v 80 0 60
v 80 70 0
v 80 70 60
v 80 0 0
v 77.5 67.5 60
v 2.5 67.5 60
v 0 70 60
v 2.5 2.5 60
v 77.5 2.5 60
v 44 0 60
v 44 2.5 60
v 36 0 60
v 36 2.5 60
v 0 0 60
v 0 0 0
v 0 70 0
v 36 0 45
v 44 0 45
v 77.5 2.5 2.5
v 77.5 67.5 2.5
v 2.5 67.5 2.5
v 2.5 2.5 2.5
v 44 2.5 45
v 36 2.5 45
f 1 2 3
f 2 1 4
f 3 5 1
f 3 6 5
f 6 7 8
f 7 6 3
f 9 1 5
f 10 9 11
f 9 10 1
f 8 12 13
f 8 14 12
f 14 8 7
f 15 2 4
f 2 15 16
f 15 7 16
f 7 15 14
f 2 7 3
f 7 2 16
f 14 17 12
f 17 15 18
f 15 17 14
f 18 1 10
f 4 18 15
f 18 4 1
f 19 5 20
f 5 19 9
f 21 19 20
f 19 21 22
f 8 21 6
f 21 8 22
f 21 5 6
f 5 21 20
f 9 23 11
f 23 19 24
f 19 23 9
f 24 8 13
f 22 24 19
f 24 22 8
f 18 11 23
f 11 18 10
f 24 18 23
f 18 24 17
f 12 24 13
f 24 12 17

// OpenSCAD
$fn = 32;

// ----------------------------------------------------------------------
// Enclosure box: notch enclosure
// ----------------------------------------------------------------------

// --- parameters (mm) ---
box_l = 80;               // outer length, X
box_w = 70;               // outer width, Y
box_h = 60;               // outer height
wall_t = 2.5;             // wall thickness
notch_w = 8;              // cable notch width
notch_h = 15;             // cable notch height

inner_h = box_h - wall_t;  // cavity depth
boss_h = inner_h - 2;  // corner boss height

difference() {
  union() {
    difference() {
      cube([box_l, box_w, box_h]);
      translate([wall_t, wall_t, wall_t])
        cube([box_l - 2 * wall_t, box_w - 2 * wall_t, box_h]);
    }
  }
  translate([box_l / 2 - notch_w / 2, -1, box_h - notch_h])
    cube([notch_w, wall_t + 2, notch_h + 1]);
}
